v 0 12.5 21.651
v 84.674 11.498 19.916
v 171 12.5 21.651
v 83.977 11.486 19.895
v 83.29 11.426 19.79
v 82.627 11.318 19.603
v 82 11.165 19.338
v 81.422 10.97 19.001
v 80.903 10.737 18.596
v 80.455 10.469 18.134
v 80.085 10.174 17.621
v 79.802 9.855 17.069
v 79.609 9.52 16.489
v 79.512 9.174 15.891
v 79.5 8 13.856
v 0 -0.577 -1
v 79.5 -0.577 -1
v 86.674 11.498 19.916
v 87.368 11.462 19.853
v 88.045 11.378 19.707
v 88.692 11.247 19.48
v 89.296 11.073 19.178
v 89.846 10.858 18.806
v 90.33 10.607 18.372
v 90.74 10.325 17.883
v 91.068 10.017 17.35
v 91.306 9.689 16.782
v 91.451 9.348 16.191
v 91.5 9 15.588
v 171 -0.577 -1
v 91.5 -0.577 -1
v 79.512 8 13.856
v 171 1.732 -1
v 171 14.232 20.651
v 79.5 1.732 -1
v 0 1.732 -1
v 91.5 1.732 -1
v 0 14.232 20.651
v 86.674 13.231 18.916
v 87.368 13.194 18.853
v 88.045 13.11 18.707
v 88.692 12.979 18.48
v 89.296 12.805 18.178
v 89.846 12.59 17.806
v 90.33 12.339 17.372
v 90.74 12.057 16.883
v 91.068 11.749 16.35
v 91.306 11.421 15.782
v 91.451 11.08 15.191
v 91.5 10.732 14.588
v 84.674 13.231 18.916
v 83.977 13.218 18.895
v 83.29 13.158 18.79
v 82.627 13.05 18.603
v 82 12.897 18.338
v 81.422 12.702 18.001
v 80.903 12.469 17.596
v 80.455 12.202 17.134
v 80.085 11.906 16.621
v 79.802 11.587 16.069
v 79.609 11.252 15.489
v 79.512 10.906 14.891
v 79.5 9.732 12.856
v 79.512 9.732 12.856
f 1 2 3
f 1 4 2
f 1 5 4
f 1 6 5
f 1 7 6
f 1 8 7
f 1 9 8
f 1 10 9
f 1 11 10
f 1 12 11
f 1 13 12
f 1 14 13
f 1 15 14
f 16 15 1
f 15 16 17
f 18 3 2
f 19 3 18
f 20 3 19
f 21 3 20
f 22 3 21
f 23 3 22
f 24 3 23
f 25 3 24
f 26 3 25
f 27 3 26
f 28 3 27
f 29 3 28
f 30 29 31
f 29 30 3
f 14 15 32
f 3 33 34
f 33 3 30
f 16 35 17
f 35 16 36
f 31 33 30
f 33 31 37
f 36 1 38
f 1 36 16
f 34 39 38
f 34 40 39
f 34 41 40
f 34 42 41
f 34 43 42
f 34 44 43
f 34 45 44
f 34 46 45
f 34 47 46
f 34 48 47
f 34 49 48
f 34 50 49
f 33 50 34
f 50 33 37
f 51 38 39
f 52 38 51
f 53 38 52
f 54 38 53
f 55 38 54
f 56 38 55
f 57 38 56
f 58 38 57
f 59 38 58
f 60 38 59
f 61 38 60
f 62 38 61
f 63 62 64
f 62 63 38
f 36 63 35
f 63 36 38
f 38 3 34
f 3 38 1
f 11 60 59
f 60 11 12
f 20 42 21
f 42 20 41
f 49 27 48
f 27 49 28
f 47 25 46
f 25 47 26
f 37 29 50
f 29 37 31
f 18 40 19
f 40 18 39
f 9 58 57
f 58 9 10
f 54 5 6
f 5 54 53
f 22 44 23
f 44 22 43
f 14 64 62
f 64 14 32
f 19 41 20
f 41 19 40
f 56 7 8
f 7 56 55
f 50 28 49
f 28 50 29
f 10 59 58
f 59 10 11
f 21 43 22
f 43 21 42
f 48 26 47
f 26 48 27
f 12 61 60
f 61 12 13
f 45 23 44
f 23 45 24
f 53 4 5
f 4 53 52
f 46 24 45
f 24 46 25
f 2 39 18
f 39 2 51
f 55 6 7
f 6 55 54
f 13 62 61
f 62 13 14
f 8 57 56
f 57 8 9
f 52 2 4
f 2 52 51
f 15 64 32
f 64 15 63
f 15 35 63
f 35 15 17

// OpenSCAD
// file: const.scad
SWITCH_WIDTH = 171;
SWITCH_DEPTH = 14;
SWITCH_HEIGHT = 100;

DOCK_SLIT_WIDTH = 8;
DOCK_SLIT_DEPTH = 2;
DOCK_SLIT_HEIGHT = 12;

BACK_HOLE_WIDTH = 42;
BACK_HOLE_HEIGHT = 5;
HOLE_VERTICAL_POSITION = DOCK_SLIT_HEIGHT - BACK_HOLE_HEIGHT;
HOLE_DISTANCE_FROM_CENTER = 4 + DOCK_SLIT_WIDTH / 2;

SUPPORT_WIDTH = 20;
// main file
include <./const.scad>

// @example
backDepth = 2;
backProlongationHeight = 25;
rotationAngle = -30;
afterRotationHeightCompensation = cos(90 - abs(rotationAngle)) * backDepth;
usbCHoleWidth = DOCK_SLIT_WIDTH + 4;
rotate([ rotationAngle, 0, 0 ])
prolongation(backDepth, backProlongationHeight, afterRotationHeightCompensation, rotationAngle, usbCHoleWidth);

module prolongation(
  backDepth,
  backProlongationHeight,
  afterRotationHeightCompensation,
  rotationAngle,
  usbCHoleWidth
) {

  difference() {

    r = 5;
    h = 1;

    hull() {

      cube([ SWITCH_WIDTH, backDepth, backProlongationHeight ]);

      baseTriangleHeight = afterRotationHeightCompensation;
      baseTriangleDepth = cos(abs(rotationAngle)) * backDepth;
      foo = sin(abs(rotationAngle)) * (baseTriangleHeight / cos(abs(rotationAngle))); // TODO find a better name
      rotate([ -rotationAngle, 0, 0 ])
      translate([ 0, 0, -afterRotationHeightCompensation ])
      polyhedron(
        [
          [ 0, -foo, 0 ], // 0
          [ SWITCH_WIDTH, -foo, 0 ], // 1
          [ SWITCH_WIDTH, baseTriangleDepth, 0 ], // 2
          [ 0, baseTriangleDepth, 0 ], // 3
          [ 0, 0, baseTriangleHeight ], // 4
          [ SWITCH_WIDTH, 0, baseTriangleHeight ], // 5
        ],
        [
          [ 0, 1, 2, 3 ],
          [ 0, 1, 5, 4 ],
          [ 0, 4, 3 ],
          [ 1, 5, 2 ],
        ]
      );

    }

    translate([ SWITCH_WIDTH / 2 - usbCHoleWidth / 2 + r, -(1 + h), 2 + r ])
    minkowski() {

      cube([ usbCHoleWidth - (r * 2), backDepth + 2 + h, backProlongationHeight - 4 - (r * 2) ]);

      $fn = 45;
      rotate([ 90, 0, 0 ])
      cylinder(r = r, h = h);

    }

    translate([ SWITCH_WIDTH / 2 - usbCHoleWidth / 2, -1, -(r + 4) ])
    cube([ usbCHoleWidth, backDepth + 2, backProlongationHeight ]);

  }

}
